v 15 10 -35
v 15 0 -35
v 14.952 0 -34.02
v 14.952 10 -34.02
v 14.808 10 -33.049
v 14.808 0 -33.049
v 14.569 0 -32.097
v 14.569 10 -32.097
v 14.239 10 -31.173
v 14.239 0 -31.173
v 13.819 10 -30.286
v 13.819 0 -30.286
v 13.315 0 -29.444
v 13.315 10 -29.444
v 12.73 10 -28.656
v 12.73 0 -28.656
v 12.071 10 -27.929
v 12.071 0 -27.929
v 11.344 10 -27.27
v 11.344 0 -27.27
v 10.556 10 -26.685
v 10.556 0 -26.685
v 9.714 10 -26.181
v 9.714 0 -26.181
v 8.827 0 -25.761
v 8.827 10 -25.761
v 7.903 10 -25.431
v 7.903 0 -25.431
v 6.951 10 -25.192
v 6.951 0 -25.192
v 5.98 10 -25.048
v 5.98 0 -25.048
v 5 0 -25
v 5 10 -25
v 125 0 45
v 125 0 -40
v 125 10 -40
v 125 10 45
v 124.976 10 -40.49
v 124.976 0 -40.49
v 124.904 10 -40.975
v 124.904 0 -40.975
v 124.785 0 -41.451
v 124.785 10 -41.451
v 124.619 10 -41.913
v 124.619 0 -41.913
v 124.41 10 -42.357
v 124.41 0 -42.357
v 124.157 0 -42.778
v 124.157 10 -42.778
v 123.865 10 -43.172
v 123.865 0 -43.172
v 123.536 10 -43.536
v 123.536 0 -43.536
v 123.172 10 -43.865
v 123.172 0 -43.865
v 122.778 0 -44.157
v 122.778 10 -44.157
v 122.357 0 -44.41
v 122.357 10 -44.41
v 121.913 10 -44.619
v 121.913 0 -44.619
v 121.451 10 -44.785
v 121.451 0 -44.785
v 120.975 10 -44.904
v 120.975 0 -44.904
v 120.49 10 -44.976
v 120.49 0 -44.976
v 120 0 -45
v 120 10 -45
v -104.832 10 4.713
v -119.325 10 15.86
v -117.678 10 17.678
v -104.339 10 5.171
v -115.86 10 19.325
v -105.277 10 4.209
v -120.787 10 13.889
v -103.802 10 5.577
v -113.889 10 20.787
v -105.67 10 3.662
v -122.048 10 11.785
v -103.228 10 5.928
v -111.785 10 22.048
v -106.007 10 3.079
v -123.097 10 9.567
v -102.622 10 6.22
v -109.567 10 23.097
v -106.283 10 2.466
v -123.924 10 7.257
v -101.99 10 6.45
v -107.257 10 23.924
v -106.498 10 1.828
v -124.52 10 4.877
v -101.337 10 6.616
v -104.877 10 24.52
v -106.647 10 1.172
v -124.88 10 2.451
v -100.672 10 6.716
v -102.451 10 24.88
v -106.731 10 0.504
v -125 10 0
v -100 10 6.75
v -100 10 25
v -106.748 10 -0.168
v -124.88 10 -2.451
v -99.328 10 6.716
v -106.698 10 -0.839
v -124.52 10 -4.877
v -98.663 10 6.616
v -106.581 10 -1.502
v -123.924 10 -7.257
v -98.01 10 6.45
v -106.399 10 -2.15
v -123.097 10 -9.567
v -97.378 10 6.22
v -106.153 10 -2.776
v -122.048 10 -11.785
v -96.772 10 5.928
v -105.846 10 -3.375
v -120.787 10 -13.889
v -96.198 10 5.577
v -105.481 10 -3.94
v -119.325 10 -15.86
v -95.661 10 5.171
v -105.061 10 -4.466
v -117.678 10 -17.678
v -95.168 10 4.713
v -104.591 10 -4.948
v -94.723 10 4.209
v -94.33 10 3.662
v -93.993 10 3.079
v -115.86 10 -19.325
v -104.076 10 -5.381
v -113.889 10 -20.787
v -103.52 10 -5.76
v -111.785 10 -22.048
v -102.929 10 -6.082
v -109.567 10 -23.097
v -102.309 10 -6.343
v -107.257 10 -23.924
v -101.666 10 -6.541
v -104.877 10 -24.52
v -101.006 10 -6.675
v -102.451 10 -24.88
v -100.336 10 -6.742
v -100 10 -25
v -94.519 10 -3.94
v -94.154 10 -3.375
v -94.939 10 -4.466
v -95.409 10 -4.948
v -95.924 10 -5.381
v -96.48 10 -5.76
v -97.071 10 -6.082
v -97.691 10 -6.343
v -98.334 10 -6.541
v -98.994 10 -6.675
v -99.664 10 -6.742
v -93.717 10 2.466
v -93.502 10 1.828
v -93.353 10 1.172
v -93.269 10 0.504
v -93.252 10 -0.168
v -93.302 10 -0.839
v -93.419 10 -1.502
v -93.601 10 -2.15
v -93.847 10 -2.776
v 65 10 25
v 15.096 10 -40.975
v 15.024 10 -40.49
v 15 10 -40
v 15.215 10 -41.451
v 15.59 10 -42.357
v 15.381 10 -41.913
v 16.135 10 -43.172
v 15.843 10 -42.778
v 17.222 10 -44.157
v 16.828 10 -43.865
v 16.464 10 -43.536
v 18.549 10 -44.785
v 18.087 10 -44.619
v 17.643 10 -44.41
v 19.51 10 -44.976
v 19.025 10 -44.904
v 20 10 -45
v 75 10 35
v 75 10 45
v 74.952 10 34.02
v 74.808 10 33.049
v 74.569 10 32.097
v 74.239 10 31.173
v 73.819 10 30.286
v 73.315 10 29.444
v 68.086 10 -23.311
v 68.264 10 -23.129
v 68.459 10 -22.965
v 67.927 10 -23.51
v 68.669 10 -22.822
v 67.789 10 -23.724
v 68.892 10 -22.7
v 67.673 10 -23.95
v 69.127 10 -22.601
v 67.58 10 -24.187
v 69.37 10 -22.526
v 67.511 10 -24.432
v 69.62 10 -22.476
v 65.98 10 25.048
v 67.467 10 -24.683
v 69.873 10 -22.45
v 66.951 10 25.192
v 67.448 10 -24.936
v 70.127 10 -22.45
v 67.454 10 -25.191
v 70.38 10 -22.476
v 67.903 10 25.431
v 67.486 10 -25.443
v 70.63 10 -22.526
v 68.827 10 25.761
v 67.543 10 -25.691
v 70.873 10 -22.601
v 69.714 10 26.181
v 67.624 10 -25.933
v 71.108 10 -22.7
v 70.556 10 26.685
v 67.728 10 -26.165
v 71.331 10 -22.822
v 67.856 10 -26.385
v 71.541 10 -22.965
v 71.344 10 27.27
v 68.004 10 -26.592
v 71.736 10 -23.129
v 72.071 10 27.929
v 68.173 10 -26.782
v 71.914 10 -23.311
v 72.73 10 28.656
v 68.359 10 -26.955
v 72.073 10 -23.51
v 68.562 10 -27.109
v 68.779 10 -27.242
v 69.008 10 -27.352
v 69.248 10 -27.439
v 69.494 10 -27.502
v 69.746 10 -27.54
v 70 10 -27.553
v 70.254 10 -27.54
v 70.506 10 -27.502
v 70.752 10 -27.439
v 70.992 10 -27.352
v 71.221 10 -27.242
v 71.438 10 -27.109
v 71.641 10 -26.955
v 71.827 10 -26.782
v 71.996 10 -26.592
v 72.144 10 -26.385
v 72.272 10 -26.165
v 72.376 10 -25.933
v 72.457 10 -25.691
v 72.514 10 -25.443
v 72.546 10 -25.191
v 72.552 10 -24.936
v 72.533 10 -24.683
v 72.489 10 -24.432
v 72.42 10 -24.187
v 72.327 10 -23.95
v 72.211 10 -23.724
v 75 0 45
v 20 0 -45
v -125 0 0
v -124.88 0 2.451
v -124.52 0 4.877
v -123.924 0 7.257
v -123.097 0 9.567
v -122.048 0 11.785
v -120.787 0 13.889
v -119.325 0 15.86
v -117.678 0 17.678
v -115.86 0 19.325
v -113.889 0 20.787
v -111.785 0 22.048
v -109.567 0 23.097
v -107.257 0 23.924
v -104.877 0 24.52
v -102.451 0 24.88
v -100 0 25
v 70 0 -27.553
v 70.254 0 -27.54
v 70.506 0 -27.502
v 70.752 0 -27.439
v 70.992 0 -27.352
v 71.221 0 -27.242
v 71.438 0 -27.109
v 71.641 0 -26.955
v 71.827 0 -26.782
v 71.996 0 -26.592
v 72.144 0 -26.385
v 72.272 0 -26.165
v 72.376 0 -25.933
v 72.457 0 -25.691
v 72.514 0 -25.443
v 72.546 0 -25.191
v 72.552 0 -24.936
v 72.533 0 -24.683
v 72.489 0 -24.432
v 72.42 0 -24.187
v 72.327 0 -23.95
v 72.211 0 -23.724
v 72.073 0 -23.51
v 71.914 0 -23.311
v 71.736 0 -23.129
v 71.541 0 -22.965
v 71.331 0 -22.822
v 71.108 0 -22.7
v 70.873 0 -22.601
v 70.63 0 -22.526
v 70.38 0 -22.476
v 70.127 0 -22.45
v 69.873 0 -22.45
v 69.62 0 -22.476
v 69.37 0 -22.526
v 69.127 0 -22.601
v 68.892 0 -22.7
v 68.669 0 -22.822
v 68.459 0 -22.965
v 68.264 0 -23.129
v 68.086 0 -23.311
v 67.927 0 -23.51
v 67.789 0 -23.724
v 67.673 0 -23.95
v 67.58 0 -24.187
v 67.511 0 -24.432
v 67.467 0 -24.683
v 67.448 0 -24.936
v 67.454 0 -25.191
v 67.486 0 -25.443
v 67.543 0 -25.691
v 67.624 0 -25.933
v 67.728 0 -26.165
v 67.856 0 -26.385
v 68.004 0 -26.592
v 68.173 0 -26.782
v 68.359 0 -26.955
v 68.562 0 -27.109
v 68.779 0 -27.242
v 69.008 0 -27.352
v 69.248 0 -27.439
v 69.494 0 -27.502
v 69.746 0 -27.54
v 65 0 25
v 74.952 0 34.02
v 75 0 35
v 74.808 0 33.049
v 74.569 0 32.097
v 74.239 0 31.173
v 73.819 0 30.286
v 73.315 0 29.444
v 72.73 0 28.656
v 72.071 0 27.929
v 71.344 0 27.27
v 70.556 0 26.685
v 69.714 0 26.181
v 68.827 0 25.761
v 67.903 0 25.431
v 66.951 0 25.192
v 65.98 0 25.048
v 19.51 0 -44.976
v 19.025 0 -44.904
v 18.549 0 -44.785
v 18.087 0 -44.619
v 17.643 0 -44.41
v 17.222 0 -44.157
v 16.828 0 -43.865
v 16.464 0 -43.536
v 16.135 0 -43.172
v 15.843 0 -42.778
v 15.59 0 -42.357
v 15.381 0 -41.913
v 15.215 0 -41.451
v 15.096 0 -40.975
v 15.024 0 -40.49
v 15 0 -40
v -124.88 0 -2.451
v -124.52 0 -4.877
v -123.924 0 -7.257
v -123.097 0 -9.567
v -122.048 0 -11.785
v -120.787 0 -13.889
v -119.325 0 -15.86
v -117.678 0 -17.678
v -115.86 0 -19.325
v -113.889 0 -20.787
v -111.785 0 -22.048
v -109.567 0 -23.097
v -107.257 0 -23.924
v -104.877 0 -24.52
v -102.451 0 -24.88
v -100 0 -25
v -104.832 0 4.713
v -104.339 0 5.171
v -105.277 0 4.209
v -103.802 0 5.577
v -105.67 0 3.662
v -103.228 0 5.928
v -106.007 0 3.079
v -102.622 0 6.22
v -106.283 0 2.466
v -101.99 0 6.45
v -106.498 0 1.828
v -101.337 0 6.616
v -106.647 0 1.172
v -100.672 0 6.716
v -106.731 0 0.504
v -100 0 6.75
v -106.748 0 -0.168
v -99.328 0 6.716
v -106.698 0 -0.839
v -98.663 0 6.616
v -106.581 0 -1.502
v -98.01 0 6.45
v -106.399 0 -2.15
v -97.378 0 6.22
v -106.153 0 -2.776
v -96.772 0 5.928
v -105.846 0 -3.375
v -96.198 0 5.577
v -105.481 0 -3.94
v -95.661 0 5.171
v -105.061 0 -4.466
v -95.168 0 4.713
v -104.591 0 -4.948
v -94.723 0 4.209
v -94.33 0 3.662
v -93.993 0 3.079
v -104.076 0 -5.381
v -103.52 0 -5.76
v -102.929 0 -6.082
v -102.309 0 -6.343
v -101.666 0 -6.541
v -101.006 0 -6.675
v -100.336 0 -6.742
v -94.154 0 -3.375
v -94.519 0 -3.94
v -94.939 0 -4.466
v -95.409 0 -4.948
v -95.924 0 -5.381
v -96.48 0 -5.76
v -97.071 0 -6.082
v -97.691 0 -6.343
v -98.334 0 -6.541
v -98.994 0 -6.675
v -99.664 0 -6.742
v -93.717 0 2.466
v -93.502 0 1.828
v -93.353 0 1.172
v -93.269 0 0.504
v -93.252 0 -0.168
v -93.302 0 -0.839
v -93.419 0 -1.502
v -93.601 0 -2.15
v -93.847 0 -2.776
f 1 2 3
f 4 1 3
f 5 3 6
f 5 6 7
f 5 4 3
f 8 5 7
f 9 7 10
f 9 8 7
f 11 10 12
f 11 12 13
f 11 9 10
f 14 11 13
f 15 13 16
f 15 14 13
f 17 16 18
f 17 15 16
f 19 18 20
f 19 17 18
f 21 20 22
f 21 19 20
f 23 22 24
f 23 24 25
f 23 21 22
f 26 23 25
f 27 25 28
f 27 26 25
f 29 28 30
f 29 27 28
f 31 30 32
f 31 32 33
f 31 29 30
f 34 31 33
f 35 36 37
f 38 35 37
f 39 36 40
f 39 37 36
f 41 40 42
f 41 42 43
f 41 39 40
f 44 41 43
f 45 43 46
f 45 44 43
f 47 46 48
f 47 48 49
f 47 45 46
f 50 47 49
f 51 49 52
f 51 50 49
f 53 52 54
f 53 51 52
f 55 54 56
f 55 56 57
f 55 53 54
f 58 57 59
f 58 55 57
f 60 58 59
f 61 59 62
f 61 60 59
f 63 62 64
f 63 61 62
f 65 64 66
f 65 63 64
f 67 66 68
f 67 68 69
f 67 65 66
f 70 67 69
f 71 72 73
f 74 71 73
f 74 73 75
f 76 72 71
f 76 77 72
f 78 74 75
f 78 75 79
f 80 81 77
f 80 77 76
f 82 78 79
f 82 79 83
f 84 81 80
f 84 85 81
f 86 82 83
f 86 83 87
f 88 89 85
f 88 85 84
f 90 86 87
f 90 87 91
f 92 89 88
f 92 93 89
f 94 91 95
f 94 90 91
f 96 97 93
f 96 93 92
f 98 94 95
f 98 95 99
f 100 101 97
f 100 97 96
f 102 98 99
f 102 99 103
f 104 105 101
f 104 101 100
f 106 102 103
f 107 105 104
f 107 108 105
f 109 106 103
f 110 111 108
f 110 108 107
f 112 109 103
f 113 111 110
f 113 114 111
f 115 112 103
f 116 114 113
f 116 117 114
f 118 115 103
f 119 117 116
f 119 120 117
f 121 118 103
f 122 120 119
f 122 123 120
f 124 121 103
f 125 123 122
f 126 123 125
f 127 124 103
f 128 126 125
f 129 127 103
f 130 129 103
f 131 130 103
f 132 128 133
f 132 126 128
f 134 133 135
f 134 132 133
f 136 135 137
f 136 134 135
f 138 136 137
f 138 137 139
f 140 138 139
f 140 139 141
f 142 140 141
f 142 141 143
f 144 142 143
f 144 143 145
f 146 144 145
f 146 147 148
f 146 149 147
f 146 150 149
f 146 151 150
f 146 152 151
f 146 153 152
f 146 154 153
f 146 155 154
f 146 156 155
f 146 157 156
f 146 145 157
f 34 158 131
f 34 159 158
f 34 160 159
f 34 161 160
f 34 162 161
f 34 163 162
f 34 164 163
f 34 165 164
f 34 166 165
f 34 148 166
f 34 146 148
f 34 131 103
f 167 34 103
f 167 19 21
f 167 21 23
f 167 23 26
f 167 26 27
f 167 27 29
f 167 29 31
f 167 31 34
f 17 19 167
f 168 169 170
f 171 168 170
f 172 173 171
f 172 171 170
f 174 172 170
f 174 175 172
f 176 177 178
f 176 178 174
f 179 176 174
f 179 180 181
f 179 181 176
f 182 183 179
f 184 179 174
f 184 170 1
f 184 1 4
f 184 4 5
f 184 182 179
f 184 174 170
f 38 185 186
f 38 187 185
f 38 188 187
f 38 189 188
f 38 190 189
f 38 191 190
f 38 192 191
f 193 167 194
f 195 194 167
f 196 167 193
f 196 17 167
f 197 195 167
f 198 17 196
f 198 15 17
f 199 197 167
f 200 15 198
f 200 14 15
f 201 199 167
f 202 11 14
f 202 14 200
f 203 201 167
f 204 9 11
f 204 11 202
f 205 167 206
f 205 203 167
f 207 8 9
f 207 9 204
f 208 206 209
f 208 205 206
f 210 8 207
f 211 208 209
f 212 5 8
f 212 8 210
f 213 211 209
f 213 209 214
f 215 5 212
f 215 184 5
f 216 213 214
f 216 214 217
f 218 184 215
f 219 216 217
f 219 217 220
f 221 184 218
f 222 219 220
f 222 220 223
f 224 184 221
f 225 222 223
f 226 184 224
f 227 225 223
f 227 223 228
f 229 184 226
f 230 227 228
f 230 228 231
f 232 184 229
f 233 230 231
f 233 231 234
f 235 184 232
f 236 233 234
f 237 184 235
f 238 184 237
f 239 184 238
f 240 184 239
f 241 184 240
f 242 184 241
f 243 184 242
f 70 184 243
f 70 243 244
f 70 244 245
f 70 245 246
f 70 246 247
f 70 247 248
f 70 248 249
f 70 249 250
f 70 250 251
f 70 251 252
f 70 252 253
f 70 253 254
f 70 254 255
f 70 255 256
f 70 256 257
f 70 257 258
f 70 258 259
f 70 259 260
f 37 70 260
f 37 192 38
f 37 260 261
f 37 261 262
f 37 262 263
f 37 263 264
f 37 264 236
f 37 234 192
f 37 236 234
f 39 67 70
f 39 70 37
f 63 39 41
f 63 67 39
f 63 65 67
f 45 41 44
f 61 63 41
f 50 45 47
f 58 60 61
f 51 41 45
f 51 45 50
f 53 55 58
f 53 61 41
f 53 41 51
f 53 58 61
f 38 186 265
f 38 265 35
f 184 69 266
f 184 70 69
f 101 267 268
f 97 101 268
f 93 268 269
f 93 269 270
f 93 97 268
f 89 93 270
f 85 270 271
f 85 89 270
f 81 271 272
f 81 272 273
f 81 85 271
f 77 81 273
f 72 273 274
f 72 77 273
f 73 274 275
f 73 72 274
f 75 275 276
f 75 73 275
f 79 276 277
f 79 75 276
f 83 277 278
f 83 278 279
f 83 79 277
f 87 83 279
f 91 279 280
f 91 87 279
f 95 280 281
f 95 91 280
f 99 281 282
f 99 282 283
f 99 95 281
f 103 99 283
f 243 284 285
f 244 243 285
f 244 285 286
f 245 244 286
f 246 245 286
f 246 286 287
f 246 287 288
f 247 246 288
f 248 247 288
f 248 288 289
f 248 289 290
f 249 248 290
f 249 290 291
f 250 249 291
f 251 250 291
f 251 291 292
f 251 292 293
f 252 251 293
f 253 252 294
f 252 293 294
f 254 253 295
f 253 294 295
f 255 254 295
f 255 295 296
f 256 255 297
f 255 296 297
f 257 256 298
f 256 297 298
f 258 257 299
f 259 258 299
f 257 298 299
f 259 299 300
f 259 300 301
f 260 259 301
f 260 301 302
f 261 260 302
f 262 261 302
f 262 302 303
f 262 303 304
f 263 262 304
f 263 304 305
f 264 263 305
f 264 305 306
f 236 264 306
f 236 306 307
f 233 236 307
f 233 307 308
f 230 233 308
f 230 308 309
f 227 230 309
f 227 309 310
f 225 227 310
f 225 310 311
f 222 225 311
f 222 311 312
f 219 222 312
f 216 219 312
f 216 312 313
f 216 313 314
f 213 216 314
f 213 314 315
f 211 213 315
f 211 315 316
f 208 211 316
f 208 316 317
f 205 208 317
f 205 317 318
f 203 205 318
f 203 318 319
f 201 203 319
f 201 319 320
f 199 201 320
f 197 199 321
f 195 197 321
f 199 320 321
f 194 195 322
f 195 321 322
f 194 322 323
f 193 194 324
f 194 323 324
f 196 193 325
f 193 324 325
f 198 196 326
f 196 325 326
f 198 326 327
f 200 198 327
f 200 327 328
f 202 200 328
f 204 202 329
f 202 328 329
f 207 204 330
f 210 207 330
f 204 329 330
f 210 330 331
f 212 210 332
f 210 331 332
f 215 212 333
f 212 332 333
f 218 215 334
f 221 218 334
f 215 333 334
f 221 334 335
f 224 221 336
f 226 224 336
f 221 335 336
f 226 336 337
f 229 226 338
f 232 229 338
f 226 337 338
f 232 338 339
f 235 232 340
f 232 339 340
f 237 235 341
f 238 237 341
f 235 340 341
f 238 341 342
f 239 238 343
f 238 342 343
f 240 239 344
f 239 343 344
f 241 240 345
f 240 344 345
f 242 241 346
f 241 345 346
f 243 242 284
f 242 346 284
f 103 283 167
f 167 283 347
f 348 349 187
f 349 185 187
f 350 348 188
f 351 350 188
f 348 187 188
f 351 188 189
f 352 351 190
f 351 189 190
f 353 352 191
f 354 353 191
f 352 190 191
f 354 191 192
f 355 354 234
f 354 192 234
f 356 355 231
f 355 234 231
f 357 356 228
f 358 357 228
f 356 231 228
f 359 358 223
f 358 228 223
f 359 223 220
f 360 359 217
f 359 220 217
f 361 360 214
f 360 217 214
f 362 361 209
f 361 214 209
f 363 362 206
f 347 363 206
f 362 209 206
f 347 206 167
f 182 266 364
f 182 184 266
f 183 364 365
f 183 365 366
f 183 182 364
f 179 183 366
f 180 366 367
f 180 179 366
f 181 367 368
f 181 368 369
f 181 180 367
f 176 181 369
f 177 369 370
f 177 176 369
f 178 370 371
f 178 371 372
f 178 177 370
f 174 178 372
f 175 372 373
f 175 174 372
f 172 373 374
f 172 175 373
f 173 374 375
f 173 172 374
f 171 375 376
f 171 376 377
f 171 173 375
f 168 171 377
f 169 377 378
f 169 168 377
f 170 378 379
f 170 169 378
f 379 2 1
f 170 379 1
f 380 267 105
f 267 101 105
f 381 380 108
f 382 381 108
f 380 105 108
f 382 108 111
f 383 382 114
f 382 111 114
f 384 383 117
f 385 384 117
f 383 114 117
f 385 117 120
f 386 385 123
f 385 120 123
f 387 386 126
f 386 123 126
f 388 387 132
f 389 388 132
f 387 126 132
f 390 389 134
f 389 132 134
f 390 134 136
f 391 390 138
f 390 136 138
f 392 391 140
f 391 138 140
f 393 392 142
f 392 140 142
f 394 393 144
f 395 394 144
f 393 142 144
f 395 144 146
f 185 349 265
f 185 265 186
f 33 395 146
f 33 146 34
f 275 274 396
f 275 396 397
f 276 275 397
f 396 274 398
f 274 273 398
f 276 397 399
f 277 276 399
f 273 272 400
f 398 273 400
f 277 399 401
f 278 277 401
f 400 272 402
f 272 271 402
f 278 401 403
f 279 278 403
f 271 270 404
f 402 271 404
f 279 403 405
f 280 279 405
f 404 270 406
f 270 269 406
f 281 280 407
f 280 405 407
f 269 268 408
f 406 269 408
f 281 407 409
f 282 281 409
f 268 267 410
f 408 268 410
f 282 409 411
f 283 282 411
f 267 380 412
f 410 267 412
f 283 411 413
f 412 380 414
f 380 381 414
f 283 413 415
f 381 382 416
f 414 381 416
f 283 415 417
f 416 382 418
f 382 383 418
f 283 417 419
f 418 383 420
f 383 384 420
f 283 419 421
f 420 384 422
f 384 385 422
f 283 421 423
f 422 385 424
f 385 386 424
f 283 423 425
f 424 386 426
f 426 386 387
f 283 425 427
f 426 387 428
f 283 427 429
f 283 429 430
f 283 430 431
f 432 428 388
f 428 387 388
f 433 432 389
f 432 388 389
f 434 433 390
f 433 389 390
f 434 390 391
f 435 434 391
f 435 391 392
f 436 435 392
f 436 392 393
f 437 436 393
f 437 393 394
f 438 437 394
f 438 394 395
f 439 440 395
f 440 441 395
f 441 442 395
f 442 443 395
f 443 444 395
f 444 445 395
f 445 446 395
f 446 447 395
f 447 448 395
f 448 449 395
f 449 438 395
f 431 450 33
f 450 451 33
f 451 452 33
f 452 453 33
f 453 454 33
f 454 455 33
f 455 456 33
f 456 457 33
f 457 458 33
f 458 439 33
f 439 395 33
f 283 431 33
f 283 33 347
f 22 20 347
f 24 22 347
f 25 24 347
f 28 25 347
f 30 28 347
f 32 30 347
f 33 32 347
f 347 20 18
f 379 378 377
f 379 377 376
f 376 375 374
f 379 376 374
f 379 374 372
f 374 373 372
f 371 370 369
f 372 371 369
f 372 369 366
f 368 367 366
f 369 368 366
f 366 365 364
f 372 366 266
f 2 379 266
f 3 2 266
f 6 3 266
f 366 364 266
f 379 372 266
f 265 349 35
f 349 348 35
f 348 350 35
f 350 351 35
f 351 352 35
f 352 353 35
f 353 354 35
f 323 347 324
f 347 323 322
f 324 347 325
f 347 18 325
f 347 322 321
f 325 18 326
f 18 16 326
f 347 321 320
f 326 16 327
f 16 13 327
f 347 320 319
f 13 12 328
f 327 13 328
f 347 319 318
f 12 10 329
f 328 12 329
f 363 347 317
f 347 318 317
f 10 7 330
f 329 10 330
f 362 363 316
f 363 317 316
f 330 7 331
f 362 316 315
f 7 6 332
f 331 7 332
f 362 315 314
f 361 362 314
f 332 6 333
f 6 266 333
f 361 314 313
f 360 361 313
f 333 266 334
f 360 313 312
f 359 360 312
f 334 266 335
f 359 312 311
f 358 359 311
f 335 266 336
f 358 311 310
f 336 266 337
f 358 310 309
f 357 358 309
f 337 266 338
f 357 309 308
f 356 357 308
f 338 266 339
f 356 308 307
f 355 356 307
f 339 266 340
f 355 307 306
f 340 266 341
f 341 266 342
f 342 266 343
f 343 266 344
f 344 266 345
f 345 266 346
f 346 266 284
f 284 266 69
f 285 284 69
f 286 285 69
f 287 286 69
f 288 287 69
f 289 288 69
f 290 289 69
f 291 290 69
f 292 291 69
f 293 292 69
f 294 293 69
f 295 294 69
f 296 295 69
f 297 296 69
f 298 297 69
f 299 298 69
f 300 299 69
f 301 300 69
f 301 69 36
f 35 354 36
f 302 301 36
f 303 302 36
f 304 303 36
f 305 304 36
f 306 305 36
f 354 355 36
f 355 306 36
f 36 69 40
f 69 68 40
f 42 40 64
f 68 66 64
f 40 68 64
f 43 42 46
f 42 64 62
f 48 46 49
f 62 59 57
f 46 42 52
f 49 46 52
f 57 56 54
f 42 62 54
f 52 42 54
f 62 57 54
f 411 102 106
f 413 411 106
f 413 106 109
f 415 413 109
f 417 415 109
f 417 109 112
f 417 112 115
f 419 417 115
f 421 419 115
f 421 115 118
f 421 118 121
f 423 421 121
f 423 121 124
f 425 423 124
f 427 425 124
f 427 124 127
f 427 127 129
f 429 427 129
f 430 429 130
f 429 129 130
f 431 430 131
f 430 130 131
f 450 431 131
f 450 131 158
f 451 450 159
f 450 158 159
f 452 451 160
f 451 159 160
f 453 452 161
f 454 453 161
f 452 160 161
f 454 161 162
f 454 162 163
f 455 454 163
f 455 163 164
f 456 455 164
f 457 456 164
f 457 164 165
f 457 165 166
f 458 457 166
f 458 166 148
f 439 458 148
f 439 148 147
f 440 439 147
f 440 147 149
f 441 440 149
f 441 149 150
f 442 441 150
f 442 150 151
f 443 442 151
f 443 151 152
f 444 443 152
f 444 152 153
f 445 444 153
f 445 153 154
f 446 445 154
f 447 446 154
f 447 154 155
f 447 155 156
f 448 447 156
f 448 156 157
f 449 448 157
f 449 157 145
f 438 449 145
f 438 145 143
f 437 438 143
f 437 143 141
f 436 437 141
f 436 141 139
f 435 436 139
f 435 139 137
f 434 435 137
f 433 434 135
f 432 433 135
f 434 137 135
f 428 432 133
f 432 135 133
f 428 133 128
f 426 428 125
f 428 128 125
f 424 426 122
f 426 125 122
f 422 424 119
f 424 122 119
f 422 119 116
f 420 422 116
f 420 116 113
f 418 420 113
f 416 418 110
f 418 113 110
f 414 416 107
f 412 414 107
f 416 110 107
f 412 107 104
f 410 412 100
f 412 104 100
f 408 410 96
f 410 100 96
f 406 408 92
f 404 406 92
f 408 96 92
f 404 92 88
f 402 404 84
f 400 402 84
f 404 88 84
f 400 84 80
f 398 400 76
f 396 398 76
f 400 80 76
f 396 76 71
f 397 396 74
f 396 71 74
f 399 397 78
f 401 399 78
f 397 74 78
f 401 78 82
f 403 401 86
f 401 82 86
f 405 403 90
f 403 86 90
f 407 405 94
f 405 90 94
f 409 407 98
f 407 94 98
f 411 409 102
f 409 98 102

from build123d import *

# Parameters (mm, degrees)
SKETCH1_W           = 250
SKETCH1_H           = 50
BOSS_EXTRUDE1_DEPTH = 10
FILLET2_R           = 25
SKETCH4_R           = 6.75
CUT_EXTRUDE3_DEPTH  = 128.867118525
SKETCH5_W           = 110
SKETCH5_H           = 10
BOSS_EXTRUDE2_DEPTH = 20
SKETCH6_W           = 50
SKETCH6_H           = 10
BOSS_EXTRUDE3_DEPTH = 20
FILLET3_R           = 10
FILLET4_R           = 5
SKETCH7_R           = 2.5527
CUT_EXTRUDE4_DEPTH  = 134.229125945


with BuildPart() as part:
    # Sketch1 → Boss-Extrude1 (new body)
    with BuildSketch(Plane(origin=(0, 0, 0), x_dir=(1, 0, 0), z_dir=(0, 1, 0))):
        Rectangle(SKETCH1_W, SKETCH1_H)
    extrude(amount=BOSS_EXTRUDE1_DEPTH)

    # Fillet2
    fillet2_edges = [part.edges().sort_by_distance(p)[0] for p in [
        (-125, 5, 25),
        (-125, 5, -25),
    ]]
    fillet(fillet2_edges, radius=FILLET2_R - 0.0001)  # a hair under: the kernel refuses the full size

    # Sketch4 → Cut-Extrude3 (cut, through all)
    with BuildSketch(Plane(origin=(0, 10, 0), x_dir=(1, 0, 0), z_dir=(0, 1, 0))):
        with Locations(Location((-100, 0, 0), (0, 0, 270))):
            Circle(SKETCH4_R)
    extrude(amount=-CUT_EXTRUDE3_DEPTH, mode=Mode.SUBTRACT)

    # Sketch5 → Boss-Extrude2 (add)
    with BuildSketch(Plane(origin=(0, 0, -25), x_dir=(-1, 0, 0), z_dir=(0, 0, -1))):
        with Locations((-70, 5)):
            Rectangle(SKETCH5_W, SKETCH5_H)
    extrude(amount=BOSS_EXTRUDE2_DEPTH)

    # Sketch6 → Boss-Extrude3 (add)
    with BuildSketch(Plane.XY.offset(25)):
        with Locations((100, 5)):
            Rectangle(SKETCH6_W, SKETCH6_H)
    extrude(amount=BOSS_EXTRUDE3_DEPTH)

    # Fillet3
    fillet3_edges = [part.edges().sort_by_distance(p)[0] for p in [
        (15, 5, -25),
        (75, 5, 25),
    ]]
    fillet(fillet3_edges, radius=FILLET3_R)

    # Fillet4
    fillet4_edges = [part.edges().sort_by_distance(p)[0] for p in [
        (125, 5, -45),
        (15, 5, -45),
    ]]
    fillet(fillet4_edges, radius=FILLET4_R)

    # Sketch7 → Cut-Extrude4 (cut, through all)
    with BuildSketch(Plane.XZ):
        with Locations(Location((70, -25, 0), (0, 0, 270))):
            Circle(SKETCH7_R)
    extrude(amount=-CUT_EXTRUDE4_DEPTH, mode=Mode.SUBTRACT)


solid = part.part
